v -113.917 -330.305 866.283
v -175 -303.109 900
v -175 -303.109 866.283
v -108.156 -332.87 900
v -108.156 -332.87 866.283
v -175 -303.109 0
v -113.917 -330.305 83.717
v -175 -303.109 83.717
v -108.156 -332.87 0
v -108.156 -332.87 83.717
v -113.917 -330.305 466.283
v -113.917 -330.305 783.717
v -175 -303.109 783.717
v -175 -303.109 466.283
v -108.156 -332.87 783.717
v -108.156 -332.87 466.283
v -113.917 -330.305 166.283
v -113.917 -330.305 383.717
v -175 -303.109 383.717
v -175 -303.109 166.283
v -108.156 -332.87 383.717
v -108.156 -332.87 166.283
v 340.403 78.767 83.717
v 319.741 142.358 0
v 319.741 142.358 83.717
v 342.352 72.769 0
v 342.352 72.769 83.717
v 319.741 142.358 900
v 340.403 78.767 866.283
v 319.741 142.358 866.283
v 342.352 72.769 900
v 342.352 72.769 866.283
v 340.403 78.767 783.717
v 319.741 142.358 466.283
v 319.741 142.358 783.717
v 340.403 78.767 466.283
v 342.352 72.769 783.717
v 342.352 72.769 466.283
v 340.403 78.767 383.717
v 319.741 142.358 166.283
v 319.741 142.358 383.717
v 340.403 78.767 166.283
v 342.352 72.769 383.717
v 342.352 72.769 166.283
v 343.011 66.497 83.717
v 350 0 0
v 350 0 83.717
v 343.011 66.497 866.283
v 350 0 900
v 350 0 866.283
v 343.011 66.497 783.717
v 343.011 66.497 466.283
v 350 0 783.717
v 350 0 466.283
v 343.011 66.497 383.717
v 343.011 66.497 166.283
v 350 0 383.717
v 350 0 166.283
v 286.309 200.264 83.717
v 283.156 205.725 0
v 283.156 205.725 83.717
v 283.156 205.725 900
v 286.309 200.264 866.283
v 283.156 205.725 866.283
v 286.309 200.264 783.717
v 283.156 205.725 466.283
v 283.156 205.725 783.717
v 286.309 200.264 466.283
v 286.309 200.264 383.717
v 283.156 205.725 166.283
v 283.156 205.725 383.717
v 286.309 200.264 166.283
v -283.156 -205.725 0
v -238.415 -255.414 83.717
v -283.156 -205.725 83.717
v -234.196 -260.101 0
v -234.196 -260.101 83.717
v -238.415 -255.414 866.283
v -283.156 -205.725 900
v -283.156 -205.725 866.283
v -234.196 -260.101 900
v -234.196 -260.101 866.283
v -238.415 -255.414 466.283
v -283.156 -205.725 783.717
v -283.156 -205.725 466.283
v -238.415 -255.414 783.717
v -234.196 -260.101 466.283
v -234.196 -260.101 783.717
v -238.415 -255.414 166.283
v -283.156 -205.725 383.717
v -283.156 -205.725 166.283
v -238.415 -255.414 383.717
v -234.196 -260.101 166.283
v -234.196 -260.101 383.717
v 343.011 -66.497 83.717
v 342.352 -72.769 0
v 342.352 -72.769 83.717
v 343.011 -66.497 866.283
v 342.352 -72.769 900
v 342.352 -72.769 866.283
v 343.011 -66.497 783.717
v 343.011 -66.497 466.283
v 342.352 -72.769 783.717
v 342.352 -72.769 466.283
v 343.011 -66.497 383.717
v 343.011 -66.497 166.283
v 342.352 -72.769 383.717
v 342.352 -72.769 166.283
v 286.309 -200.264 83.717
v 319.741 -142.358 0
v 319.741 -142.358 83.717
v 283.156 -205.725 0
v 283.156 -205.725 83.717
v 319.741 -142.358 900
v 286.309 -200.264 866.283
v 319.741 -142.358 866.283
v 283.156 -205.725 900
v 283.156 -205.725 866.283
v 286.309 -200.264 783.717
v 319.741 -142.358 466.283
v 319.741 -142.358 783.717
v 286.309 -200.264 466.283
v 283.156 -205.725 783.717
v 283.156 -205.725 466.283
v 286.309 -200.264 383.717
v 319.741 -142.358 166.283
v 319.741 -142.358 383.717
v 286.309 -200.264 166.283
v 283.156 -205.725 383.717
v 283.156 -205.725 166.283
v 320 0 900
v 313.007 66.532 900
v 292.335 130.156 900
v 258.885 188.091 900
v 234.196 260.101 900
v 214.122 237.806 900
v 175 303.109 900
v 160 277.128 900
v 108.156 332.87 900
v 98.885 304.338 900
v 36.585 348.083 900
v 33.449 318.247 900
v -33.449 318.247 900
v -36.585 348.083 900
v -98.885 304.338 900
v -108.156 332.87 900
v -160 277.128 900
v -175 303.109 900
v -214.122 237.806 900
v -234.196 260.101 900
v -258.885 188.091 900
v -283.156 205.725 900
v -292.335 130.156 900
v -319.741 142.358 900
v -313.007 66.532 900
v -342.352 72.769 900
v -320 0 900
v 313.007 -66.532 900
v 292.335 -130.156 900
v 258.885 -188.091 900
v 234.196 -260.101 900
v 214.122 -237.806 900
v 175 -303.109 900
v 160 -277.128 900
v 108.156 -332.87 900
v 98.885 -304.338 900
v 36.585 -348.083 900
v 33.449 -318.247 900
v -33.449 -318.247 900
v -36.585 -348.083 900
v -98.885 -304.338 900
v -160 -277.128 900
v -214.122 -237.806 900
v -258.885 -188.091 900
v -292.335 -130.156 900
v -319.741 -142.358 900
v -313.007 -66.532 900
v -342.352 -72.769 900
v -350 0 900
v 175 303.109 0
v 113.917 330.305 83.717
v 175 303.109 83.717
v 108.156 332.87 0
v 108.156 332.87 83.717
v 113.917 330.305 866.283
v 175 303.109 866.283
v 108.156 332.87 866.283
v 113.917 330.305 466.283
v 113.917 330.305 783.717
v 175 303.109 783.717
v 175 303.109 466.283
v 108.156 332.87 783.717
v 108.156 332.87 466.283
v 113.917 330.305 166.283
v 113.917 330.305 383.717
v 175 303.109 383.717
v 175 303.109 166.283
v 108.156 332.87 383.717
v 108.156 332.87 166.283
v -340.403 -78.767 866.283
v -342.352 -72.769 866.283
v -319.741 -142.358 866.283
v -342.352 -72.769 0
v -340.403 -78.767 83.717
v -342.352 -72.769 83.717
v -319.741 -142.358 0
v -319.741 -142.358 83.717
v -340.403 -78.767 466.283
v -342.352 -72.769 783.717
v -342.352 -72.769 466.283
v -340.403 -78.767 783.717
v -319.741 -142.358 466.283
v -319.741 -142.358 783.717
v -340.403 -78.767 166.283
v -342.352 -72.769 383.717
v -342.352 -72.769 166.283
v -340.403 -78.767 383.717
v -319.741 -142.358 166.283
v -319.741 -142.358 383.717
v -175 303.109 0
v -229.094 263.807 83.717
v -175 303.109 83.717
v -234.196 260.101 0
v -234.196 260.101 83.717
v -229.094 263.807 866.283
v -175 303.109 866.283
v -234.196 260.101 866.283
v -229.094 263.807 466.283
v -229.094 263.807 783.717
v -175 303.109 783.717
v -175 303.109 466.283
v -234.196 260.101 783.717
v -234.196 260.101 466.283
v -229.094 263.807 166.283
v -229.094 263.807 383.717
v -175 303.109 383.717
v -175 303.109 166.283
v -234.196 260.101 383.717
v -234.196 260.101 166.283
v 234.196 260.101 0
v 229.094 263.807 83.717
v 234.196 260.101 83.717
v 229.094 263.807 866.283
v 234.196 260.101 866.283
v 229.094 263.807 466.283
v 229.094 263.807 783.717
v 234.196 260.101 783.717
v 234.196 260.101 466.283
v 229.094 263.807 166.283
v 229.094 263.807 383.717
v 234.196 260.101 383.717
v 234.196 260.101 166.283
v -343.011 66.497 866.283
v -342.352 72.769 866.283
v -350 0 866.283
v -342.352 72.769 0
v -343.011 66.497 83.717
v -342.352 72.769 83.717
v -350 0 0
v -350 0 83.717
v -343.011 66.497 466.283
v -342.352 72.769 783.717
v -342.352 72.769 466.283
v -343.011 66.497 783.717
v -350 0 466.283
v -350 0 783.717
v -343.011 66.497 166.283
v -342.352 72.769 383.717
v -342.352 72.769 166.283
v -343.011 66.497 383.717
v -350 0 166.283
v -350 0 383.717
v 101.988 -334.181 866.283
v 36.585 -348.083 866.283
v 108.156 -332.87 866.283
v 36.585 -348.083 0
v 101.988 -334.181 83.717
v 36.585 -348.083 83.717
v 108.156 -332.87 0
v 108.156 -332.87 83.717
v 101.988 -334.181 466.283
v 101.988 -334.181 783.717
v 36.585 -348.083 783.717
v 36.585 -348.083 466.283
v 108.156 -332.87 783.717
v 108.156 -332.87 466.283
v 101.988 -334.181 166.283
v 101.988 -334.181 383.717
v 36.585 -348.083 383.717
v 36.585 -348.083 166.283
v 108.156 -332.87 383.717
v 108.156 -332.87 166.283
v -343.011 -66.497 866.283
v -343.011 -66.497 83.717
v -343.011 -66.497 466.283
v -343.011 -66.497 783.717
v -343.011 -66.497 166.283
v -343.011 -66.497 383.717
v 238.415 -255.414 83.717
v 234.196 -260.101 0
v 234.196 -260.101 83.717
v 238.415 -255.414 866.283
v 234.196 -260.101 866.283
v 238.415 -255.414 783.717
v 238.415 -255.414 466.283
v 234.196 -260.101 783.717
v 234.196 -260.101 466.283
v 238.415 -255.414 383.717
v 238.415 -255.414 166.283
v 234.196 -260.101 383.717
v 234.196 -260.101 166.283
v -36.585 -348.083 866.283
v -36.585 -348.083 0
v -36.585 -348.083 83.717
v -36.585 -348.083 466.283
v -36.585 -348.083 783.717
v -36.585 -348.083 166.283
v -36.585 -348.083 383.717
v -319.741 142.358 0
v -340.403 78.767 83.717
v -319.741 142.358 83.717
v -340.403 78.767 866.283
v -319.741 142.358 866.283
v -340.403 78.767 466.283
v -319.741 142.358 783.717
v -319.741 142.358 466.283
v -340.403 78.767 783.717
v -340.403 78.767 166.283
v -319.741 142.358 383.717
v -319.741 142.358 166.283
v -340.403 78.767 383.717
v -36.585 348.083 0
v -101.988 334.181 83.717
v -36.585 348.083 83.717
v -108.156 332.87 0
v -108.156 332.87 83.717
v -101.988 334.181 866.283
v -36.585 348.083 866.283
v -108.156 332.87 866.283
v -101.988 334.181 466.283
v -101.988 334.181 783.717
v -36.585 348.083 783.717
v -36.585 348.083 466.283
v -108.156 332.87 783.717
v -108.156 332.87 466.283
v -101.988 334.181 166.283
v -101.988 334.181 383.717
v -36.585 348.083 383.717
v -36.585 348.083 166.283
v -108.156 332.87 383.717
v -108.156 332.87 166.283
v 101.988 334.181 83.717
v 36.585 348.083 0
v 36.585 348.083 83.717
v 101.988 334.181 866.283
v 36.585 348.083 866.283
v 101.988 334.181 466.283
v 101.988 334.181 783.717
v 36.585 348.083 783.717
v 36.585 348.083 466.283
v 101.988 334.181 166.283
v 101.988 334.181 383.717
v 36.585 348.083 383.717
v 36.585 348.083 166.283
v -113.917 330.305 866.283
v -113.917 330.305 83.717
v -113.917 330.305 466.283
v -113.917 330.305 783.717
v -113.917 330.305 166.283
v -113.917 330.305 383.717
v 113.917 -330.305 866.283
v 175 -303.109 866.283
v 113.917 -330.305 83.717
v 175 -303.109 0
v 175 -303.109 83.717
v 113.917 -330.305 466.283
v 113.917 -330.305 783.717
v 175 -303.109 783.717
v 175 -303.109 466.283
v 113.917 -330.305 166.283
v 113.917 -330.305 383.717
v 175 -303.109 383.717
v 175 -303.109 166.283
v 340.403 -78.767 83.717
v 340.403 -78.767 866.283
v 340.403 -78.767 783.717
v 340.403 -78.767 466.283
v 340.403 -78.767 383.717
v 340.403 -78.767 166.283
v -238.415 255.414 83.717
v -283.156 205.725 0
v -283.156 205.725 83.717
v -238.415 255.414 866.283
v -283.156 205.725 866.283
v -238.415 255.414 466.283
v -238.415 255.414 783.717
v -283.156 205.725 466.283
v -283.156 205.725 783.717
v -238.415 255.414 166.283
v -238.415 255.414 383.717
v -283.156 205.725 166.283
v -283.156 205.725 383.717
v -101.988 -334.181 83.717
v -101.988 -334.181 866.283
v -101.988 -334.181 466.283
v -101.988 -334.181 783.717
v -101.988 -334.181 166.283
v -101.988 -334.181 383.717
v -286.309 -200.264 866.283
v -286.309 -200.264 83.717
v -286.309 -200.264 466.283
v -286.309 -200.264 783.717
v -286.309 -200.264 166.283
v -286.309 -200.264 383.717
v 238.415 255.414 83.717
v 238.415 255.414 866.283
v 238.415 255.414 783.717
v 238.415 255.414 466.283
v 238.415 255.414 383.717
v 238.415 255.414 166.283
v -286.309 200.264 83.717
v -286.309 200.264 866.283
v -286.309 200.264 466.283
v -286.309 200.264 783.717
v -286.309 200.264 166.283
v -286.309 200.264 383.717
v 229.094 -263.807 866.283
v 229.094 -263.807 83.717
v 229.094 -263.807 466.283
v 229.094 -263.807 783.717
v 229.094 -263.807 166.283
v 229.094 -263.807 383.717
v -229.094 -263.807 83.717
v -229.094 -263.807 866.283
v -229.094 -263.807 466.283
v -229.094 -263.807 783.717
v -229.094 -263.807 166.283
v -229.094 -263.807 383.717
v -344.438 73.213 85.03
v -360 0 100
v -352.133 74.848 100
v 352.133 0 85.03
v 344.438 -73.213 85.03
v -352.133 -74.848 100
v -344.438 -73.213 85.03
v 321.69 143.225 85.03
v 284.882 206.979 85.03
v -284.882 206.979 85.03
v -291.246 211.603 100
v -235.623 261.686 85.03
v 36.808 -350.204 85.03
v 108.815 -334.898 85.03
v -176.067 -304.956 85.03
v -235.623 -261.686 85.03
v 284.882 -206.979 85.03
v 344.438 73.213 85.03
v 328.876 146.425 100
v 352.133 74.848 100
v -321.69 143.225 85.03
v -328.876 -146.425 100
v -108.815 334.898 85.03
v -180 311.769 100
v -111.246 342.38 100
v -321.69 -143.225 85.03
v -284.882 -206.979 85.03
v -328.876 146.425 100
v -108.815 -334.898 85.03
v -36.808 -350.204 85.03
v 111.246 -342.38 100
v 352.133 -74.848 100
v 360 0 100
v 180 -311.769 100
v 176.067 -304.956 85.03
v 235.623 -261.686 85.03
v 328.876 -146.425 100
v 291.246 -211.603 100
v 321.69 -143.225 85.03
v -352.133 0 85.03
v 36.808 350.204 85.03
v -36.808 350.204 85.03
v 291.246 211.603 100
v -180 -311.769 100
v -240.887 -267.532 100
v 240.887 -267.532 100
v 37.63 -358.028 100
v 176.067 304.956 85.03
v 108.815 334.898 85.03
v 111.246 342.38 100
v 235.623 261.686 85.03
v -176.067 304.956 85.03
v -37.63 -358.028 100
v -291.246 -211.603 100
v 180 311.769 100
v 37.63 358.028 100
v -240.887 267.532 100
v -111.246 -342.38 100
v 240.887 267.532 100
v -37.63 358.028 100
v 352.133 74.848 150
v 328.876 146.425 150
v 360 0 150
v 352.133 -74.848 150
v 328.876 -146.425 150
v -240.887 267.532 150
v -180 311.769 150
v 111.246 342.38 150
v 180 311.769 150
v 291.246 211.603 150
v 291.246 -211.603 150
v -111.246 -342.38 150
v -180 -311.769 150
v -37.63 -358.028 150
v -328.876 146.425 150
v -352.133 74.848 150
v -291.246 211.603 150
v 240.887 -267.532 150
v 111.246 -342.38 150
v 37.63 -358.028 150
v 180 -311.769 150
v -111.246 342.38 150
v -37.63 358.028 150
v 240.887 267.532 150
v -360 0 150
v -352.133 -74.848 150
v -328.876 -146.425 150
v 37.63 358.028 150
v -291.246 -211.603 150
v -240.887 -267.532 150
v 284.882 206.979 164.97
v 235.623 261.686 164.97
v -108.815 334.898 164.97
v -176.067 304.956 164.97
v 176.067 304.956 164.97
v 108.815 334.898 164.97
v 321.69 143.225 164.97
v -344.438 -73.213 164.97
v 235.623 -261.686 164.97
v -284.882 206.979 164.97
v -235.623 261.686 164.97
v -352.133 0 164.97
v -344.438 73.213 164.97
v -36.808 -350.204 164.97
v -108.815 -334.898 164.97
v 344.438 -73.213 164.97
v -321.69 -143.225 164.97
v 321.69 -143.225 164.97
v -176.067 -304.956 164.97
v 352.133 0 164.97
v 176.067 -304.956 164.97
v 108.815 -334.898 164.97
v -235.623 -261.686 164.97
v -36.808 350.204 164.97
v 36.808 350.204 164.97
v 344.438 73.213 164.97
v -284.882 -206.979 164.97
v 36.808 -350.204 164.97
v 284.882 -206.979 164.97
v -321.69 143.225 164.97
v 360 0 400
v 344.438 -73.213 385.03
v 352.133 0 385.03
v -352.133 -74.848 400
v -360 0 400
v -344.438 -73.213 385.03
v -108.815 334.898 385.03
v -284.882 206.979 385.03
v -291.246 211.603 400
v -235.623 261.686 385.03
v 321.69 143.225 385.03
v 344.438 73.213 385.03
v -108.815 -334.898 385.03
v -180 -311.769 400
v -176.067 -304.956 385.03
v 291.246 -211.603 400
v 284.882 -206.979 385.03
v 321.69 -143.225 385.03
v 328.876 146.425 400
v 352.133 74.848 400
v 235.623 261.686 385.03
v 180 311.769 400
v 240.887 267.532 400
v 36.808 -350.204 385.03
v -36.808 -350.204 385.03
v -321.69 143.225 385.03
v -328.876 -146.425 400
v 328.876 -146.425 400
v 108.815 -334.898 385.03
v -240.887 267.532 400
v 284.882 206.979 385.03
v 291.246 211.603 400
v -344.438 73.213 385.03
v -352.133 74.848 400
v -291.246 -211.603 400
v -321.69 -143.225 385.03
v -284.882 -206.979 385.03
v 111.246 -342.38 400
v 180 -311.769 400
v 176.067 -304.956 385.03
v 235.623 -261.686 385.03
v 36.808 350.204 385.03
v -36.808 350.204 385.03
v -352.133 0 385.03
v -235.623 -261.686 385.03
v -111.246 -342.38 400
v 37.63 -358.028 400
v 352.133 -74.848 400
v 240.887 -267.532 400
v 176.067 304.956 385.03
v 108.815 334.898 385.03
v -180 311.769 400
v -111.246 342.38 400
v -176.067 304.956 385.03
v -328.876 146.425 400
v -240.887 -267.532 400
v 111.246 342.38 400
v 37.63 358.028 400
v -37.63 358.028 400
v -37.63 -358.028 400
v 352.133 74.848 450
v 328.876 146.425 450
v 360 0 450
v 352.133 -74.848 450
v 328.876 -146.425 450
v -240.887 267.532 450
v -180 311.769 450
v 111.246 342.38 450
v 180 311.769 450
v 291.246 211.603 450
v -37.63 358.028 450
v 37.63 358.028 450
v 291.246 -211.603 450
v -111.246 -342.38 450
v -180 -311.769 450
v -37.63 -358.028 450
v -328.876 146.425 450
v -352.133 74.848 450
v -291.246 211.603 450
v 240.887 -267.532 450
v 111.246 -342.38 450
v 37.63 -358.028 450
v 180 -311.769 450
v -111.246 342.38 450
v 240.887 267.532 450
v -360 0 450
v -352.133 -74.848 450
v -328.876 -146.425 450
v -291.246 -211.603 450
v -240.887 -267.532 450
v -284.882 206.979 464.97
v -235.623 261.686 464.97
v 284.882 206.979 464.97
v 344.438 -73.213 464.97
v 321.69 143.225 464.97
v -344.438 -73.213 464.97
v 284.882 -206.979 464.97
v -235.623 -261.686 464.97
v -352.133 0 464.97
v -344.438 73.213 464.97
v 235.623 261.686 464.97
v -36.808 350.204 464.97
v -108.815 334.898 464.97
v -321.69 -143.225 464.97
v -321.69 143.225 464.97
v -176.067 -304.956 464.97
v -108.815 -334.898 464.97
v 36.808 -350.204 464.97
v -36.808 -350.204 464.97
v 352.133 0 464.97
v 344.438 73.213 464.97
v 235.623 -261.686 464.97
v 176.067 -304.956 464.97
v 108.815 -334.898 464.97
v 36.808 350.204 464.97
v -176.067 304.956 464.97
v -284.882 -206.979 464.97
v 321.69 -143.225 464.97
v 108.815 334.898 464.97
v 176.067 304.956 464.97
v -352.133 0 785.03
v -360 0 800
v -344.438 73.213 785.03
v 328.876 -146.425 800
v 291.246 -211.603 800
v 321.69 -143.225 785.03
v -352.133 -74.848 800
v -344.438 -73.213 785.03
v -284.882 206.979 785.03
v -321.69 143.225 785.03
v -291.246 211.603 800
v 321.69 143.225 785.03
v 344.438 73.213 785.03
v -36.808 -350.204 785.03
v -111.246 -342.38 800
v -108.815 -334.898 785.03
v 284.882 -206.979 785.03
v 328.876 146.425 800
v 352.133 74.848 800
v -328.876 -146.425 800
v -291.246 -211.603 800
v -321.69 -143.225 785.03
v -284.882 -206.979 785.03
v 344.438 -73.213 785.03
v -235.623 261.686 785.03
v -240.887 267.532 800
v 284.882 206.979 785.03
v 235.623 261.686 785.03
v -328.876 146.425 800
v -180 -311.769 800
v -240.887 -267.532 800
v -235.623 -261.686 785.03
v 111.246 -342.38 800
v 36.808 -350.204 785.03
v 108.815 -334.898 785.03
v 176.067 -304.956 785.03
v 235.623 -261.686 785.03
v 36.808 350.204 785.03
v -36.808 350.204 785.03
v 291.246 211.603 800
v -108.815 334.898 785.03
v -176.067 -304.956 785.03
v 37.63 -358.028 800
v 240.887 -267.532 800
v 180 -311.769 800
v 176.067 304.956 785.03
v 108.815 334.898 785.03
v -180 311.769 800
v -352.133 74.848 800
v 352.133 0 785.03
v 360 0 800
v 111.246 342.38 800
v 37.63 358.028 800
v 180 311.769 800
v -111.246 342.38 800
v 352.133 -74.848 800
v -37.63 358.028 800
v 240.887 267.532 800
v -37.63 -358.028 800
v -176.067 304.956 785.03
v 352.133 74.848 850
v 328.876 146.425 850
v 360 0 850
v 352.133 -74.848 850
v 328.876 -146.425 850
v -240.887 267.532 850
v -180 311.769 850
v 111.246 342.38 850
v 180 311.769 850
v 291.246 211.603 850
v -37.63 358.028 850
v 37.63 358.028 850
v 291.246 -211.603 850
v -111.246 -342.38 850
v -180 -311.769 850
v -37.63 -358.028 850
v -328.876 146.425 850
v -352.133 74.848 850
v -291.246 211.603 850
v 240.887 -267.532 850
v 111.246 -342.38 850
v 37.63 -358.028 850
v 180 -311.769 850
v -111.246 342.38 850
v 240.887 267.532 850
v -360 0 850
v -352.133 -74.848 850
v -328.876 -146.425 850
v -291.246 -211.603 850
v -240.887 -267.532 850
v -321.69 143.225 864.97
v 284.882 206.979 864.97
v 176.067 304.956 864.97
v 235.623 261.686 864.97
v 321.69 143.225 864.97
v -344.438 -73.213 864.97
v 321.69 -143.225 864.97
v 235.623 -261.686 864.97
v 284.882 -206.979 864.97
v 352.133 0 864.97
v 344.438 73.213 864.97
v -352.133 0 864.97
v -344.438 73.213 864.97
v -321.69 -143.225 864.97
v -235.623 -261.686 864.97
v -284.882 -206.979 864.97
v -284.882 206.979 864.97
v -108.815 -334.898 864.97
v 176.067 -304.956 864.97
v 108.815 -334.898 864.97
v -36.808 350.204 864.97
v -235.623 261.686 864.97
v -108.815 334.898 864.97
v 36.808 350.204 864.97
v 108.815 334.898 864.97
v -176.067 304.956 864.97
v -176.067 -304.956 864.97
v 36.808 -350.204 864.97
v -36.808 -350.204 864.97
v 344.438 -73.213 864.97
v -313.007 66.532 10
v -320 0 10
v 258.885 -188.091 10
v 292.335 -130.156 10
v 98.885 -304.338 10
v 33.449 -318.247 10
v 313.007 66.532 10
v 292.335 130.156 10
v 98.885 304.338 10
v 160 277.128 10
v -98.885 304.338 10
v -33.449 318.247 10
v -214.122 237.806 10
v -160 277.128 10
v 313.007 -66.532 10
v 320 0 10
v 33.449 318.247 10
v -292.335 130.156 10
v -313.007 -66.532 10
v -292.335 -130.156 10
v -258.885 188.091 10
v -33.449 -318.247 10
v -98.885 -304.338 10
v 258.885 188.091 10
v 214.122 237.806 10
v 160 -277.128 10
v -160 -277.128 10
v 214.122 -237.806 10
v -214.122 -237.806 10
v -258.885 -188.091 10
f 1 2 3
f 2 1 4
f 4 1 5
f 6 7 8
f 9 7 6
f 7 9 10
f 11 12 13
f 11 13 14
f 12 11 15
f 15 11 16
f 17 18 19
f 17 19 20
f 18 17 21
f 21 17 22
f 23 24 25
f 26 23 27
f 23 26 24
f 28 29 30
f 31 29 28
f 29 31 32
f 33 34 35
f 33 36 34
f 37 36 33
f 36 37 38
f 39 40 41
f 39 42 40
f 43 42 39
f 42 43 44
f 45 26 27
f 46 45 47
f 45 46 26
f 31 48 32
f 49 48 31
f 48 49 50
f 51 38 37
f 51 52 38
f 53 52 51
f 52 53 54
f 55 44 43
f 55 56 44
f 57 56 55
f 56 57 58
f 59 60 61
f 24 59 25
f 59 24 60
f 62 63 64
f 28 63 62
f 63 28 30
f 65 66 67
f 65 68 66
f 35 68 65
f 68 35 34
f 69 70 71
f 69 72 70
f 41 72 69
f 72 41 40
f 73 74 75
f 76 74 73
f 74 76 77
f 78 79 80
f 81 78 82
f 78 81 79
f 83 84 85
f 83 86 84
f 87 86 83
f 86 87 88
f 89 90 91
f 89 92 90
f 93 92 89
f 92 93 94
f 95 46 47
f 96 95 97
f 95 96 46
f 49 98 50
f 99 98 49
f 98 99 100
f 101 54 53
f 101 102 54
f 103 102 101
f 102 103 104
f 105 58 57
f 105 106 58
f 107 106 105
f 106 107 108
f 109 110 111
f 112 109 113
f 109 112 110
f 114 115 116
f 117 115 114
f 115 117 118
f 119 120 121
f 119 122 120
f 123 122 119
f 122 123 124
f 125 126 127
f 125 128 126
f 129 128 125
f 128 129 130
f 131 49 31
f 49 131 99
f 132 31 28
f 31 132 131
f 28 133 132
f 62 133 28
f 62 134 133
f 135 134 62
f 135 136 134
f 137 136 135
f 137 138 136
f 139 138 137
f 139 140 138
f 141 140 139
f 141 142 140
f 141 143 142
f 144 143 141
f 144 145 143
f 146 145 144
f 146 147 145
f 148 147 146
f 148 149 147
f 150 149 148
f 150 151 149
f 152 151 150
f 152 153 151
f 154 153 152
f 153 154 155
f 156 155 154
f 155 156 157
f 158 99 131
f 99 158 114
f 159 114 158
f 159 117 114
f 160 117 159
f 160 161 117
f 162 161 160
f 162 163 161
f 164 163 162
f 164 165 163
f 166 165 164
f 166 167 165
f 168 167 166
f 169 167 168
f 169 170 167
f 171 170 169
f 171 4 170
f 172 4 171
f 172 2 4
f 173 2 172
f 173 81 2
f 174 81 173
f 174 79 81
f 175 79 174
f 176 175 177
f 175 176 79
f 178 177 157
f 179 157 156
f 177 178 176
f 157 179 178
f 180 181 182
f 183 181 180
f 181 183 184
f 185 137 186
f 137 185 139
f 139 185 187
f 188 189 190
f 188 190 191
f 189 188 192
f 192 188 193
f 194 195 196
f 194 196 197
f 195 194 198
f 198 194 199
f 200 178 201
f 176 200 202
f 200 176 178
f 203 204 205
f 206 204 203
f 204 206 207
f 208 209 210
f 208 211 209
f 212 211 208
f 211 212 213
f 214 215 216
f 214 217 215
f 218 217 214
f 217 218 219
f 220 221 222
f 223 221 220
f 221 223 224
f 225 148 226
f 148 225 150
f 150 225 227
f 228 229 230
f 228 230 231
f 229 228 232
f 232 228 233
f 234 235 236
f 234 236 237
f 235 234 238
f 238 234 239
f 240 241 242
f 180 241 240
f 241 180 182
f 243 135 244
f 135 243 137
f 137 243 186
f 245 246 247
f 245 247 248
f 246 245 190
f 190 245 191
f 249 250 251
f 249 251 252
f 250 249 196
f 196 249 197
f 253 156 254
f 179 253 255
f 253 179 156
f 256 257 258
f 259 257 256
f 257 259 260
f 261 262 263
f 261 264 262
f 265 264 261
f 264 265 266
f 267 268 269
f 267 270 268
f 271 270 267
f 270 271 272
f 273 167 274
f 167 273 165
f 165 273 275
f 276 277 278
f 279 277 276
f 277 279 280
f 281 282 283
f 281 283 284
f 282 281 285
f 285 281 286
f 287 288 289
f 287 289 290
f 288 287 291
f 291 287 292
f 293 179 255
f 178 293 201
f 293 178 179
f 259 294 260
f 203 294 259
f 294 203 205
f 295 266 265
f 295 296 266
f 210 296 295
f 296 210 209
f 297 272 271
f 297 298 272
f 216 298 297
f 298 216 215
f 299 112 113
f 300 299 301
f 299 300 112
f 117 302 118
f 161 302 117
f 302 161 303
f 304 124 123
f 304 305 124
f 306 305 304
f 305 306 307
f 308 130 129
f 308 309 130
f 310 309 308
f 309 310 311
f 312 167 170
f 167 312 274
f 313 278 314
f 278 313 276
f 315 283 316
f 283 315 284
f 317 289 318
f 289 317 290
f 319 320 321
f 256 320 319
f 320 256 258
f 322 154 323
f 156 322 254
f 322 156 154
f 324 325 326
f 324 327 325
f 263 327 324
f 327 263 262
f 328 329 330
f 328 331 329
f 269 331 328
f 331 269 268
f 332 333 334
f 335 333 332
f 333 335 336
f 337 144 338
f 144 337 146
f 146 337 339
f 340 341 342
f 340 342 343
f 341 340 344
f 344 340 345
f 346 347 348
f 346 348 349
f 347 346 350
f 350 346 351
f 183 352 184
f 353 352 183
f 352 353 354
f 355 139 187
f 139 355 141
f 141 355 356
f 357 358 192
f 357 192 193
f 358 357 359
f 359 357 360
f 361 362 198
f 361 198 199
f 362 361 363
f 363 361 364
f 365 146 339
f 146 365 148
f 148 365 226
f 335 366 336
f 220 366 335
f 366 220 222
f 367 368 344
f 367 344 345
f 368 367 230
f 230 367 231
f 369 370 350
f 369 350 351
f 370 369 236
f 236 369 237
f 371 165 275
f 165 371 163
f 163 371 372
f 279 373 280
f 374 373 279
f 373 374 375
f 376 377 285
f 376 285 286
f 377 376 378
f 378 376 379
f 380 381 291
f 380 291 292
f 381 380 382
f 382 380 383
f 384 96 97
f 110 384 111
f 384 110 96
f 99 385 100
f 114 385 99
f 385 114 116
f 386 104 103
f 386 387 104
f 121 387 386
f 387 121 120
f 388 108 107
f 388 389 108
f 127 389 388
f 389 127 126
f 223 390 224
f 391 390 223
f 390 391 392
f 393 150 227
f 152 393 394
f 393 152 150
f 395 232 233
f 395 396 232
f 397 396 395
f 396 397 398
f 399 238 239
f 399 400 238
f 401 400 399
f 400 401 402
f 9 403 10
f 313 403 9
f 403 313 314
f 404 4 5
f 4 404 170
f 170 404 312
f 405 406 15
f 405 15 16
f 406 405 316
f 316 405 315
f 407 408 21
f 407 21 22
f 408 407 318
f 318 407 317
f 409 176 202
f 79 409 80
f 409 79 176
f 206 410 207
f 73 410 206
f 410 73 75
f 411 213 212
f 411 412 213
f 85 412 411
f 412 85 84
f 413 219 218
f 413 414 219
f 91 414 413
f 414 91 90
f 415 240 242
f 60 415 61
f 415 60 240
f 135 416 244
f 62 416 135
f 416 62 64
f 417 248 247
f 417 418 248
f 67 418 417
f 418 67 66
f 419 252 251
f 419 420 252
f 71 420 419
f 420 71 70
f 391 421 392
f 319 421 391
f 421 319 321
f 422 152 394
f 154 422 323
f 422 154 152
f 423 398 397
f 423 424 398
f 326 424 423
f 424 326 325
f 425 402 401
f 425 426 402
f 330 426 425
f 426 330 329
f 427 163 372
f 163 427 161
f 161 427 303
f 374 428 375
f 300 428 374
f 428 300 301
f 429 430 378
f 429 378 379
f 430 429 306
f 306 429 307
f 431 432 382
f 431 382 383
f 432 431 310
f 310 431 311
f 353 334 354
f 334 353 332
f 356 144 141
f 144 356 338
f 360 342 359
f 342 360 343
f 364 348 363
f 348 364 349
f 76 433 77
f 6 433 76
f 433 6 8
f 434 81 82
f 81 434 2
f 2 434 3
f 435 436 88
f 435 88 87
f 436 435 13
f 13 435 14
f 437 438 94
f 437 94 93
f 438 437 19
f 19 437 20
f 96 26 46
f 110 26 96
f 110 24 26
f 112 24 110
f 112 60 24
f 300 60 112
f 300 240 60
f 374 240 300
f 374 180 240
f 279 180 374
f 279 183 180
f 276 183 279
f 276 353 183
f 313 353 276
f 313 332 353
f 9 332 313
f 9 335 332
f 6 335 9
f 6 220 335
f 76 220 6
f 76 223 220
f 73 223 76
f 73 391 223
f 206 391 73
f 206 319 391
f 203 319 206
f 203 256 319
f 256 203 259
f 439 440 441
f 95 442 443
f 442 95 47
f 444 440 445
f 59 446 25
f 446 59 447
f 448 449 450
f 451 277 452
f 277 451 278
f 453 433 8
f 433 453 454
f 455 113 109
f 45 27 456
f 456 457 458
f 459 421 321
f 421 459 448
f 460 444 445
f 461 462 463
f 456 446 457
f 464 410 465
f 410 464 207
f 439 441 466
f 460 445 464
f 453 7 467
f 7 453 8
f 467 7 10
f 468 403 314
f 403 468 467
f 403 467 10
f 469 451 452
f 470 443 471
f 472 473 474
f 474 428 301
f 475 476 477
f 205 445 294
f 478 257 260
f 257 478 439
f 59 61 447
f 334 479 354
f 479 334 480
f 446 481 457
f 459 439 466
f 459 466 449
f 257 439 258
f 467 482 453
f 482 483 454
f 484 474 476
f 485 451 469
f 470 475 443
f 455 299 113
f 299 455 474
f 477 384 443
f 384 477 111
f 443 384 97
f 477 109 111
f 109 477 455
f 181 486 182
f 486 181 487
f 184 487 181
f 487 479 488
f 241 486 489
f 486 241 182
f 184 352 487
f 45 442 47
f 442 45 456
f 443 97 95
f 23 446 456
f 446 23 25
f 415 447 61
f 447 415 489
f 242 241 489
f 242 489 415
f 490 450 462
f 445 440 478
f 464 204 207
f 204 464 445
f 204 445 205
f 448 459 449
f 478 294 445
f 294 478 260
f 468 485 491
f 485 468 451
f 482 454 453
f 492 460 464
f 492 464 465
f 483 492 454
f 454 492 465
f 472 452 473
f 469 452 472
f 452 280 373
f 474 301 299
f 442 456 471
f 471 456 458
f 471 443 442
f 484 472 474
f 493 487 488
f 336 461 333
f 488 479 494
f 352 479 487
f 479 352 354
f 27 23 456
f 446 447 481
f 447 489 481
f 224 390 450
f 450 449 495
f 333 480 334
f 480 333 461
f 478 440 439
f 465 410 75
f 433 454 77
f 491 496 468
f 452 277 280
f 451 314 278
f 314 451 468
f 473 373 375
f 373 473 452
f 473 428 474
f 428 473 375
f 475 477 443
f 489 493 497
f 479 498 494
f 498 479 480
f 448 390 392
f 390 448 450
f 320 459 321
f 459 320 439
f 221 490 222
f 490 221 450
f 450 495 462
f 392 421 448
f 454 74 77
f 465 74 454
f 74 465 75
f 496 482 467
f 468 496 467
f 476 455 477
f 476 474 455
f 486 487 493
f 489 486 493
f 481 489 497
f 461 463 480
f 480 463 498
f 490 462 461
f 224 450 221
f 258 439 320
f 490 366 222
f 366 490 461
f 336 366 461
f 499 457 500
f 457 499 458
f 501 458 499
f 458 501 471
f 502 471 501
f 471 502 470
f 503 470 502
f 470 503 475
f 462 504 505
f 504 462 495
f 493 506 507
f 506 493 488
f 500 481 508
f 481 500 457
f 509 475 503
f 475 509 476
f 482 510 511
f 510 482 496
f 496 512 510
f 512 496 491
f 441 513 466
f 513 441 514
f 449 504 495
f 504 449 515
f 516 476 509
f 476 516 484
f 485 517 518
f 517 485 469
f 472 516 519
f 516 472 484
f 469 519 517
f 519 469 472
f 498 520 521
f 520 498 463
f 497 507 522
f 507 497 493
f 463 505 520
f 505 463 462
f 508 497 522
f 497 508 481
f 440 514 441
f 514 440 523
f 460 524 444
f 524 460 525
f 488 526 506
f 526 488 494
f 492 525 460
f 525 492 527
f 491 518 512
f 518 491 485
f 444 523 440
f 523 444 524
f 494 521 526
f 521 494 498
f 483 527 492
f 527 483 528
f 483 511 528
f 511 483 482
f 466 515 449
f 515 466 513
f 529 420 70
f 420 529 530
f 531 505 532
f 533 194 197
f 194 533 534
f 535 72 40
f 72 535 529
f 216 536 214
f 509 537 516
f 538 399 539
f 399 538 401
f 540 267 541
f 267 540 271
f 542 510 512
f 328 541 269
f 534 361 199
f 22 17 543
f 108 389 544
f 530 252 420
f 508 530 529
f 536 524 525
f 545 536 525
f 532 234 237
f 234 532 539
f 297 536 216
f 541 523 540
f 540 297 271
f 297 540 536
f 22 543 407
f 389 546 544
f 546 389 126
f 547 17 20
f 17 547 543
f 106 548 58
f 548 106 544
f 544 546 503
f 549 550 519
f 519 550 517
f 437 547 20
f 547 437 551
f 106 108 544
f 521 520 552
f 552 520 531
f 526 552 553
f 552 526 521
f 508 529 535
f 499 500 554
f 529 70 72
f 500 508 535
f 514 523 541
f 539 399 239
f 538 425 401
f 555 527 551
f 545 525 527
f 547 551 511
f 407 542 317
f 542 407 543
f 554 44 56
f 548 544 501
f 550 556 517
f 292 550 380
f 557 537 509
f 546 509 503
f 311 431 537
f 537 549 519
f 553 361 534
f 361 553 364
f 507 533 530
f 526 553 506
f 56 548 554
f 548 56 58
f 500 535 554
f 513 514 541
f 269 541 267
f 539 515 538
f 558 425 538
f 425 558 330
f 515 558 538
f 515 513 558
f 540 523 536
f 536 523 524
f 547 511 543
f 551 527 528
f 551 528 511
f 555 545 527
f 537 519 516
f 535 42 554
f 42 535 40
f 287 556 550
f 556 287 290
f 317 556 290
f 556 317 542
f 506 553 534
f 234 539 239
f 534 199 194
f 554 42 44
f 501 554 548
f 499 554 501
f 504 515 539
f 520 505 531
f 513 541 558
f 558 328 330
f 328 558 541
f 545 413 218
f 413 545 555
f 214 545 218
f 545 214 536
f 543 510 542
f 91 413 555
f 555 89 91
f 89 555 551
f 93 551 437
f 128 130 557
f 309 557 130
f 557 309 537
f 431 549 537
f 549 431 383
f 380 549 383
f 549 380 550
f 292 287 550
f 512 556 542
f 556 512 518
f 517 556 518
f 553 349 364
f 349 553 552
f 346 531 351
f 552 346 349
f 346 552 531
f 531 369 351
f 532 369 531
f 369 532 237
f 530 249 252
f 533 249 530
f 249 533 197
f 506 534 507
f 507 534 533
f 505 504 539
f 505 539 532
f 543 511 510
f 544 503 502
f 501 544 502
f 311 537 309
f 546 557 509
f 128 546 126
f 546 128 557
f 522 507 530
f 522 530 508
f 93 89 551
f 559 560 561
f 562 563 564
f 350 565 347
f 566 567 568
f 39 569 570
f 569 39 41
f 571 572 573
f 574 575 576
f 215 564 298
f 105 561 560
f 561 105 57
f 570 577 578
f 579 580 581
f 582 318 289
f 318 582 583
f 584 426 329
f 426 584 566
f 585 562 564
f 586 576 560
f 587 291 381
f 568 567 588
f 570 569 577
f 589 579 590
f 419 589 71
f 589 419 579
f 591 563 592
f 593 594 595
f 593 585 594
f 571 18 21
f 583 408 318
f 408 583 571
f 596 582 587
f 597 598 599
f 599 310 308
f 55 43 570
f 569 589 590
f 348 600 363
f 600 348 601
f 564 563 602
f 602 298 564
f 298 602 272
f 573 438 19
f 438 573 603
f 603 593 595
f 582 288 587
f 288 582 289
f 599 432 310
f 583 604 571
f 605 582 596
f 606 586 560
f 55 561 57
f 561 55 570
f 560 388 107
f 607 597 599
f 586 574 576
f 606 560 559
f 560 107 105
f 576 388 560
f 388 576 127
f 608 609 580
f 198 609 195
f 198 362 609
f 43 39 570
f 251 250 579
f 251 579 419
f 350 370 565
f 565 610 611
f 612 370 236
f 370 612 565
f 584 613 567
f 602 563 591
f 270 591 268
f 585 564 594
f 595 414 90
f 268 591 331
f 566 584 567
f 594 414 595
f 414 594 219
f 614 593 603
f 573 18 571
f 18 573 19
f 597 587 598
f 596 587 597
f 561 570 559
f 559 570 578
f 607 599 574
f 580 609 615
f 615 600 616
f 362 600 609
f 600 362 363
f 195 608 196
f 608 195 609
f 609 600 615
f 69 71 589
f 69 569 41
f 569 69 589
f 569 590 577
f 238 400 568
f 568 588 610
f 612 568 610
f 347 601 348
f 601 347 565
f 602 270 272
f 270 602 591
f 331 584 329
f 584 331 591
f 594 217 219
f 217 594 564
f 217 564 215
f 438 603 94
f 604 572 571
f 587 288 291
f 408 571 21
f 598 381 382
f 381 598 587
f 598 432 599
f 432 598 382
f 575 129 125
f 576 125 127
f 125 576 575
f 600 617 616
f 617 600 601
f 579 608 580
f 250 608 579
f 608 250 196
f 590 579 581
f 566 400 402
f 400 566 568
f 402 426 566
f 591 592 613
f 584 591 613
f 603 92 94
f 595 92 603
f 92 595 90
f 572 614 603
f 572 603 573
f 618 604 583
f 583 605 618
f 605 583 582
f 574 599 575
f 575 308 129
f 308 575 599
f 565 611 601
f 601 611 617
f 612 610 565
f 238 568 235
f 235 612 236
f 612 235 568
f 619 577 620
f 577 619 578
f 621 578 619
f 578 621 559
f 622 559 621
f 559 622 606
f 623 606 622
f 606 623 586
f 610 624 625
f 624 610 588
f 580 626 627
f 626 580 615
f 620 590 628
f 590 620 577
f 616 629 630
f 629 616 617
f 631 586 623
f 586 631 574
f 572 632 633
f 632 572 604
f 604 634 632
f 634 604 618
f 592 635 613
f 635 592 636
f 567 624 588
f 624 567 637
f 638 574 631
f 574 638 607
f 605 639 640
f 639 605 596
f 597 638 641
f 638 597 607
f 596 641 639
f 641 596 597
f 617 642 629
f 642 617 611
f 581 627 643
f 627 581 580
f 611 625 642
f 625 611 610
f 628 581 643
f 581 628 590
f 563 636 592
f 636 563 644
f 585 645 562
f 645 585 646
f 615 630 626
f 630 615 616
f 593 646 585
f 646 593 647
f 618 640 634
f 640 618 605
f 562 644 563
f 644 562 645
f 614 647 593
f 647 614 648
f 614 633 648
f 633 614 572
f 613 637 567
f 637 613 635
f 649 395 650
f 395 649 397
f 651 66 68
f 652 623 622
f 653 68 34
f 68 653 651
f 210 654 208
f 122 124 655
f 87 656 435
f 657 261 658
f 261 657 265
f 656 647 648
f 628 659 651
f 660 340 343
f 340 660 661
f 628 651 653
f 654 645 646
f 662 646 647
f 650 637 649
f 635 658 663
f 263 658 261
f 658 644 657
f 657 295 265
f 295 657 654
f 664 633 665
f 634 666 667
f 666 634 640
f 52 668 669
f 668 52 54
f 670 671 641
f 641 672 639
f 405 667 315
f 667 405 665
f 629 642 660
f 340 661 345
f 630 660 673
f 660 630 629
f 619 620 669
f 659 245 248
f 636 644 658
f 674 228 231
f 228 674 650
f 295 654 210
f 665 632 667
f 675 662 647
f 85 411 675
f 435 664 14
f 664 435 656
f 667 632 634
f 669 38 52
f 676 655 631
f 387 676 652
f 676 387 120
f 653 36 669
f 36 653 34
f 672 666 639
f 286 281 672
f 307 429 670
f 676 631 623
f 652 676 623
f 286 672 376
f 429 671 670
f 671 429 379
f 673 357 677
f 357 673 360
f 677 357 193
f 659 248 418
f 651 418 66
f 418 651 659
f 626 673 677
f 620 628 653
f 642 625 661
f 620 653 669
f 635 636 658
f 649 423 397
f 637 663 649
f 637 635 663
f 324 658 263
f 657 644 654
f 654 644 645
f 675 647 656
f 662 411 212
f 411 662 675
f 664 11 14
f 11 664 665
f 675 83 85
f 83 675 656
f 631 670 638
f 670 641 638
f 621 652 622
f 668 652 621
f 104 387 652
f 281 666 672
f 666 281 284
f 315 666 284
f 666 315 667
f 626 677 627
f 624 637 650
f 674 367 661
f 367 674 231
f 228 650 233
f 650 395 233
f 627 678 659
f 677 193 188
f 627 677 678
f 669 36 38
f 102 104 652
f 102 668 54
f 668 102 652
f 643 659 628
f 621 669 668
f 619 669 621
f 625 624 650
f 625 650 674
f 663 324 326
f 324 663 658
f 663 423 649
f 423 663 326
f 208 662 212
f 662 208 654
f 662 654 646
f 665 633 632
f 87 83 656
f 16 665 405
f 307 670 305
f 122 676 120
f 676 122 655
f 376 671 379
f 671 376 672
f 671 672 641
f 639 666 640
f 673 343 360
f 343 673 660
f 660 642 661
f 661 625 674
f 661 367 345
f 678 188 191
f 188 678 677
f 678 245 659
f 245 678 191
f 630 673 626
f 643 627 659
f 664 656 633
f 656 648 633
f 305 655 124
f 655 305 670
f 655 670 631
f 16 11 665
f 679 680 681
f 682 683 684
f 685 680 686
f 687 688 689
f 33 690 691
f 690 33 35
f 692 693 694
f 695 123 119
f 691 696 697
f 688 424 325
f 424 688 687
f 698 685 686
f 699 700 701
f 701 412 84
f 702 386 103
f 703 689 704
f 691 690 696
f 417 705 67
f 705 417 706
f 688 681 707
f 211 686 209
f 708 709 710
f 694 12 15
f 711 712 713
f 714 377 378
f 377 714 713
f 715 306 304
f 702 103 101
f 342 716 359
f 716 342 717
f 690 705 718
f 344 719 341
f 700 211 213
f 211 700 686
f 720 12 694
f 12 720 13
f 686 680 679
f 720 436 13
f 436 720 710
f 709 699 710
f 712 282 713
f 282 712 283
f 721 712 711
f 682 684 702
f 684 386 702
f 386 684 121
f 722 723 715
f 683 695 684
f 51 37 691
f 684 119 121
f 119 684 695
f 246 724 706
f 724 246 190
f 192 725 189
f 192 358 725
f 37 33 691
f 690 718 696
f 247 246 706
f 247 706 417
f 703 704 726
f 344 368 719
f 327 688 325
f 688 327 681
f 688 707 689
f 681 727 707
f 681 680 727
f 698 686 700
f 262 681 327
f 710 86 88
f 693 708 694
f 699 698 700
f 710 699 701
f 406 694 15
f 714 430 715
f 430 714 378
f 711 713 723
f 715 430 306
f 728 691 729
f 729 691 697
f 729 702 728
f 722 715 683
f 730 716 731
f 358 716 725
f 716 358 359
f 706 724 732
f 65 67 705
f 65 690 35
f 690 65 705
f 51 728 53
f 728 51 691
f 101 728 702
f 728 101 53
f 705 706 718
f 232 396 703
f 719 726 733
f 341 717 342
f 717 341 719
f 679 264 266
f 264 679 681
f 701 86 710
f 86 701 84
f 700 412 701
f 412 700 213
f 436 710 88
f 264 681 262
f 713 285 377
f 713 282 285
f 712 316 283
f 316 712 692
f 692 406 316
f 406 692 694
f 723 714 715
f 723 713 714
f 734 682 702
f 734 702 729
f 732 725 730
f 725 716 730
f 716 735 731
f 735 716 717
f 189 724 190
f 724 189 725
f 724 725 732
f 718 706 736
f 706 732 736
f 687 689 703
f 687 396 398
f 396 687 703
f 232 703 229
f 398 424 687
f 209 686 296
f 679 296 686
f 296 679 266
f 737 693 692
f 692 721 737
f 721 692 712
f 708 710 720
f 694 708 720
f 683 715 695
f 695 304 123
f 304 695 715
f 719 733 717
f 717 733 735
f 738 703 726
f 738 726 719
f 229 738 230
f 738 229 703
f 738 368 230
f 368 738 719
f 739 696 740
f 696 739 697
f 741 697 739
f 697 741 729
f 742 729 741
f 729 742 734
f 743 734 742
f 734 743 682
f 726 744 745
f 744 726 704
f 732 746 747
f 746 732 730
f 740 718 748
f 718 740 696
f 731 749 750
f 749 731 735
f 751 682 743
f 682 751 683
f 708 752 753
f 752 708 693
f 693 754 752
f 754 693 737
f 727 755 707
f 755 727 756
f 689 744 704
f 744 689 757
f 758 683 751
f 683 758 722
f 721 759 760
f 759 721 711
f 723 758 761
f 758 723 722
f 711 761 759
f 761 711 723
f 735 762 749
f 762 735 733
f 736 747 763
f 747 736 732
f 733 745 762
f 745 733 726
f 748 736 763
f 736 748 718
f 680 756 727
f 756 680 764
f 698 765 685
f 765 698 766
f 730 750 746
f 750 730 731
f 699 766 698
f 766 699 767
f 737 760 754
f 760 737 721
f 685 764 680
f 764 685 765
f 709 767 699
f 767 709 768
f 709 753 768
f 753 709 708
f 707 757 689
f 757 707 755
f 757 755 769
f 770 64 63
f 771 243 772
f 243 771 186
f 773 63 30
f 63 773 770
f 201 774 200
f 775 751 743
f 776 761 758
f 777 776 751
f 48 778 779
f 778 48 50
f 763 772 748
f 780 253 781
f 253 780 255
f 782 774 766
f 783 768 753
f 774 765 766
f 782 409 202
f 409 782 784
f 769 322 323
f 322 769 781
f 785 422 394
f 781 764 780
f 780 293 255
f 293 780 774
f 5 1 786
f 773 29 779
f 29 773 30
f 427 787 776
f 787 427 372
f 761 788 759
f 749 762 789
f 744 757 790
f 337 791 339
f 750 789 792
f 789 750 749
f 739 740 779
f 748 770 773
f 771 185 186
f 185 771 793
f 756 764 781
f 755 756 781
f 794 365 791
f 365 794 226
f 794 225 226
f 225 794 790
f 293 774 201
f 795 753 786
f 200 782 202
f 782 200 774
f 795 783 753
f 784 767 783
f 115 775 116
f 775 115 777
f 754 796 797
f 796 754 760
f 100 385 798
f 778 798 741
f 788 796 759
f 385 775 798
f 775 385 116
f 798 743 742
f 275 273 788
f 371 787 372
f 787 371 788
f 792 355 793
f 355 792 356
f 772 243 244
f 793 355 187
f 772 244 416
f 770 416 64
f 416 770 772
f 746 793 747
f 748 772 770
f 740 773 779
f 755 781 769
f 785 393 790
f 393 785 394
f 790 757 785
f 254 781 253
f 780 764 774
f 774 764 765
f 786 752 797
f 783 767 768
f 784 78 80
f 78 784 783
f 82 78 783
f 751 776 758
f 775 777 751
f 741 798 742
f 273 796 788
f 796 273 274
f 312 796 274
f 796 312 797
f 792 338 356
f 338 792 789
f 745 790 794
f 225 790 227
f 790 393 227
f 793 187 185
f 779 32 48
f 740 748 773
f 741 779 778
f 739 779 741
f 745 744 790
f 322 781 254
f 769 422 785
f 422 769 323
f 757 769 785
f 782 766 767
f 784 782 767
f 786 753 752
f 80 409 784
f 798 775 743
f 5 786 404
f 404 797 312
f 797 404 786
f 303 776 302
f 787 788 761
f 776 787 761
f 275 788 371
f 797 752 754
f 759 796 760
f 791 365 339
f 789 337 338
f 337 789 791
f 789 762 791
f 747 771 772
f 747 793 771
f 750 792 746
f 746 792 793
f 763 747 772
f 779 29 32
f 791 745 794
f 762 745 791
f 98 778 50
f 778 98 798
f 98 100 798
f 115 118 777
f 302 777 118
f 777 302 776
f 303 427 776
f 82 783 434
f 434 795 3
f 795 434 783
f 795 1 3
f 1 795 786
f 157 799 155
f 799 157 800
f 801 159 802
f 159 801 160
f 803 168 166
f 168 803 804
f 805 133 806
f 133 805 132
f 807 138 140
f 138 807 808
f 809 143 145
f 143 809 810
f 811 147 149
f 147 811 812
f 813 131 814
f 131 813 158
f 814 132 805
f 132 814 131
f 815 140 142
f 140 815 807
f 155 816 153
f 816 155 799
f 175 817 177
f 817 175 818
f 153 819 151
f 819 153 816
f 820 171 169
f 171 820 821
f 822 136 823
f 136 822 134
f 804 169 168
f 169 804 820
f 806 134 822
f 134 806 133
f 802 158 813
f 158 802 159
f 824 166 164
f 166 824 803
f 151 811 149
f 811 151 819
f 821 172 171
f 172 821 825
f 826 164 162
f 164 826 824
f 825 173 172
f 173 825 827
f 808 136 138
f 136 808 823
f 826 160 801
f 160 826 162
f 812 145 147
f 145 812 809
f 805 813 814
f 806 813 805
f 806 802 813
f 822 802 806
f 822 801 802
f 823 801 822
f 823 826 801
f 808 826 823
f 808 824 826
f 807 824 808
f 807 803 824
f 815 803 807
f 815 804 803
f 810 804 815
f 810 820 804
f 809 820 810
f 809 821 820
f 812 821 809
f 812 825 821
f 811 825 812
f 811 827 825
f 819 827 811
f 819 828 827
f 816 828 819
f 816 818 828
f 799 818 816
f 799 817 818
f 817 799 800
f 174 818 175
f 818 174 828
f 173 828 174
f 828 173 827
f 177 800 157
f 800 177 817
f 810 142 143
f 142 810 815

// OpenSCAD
a=30;


module un(){
cylinder(900,350,350,$fn=a);
translate([0,0,100])scale([1,1,0.2])sphere(360);
translate([0,0,100])cylinder(50,360,360,$fn=a);
translate([0,0,150])scale([1,1,0.2])sphere(360);

translate([0,0,400])scale([1,1,0.2])sphere(360);
translate([0,0,400])cylinder(50,360,360,$fn=a);
translate([0,0,450])scale([1,1,0.2])sphere(360);

translate([0,0,800])scale([1,1,0.2])sphere(360);
translate([0,0,800])cylinder(50,360,360,$fn=a);
translate([0,0,850])scale([1,1,0.2])sphere(360);
}

difference(){
    un();
    
    translate([0,0,10])cylinder(950,320,320,$fn=a);
}
